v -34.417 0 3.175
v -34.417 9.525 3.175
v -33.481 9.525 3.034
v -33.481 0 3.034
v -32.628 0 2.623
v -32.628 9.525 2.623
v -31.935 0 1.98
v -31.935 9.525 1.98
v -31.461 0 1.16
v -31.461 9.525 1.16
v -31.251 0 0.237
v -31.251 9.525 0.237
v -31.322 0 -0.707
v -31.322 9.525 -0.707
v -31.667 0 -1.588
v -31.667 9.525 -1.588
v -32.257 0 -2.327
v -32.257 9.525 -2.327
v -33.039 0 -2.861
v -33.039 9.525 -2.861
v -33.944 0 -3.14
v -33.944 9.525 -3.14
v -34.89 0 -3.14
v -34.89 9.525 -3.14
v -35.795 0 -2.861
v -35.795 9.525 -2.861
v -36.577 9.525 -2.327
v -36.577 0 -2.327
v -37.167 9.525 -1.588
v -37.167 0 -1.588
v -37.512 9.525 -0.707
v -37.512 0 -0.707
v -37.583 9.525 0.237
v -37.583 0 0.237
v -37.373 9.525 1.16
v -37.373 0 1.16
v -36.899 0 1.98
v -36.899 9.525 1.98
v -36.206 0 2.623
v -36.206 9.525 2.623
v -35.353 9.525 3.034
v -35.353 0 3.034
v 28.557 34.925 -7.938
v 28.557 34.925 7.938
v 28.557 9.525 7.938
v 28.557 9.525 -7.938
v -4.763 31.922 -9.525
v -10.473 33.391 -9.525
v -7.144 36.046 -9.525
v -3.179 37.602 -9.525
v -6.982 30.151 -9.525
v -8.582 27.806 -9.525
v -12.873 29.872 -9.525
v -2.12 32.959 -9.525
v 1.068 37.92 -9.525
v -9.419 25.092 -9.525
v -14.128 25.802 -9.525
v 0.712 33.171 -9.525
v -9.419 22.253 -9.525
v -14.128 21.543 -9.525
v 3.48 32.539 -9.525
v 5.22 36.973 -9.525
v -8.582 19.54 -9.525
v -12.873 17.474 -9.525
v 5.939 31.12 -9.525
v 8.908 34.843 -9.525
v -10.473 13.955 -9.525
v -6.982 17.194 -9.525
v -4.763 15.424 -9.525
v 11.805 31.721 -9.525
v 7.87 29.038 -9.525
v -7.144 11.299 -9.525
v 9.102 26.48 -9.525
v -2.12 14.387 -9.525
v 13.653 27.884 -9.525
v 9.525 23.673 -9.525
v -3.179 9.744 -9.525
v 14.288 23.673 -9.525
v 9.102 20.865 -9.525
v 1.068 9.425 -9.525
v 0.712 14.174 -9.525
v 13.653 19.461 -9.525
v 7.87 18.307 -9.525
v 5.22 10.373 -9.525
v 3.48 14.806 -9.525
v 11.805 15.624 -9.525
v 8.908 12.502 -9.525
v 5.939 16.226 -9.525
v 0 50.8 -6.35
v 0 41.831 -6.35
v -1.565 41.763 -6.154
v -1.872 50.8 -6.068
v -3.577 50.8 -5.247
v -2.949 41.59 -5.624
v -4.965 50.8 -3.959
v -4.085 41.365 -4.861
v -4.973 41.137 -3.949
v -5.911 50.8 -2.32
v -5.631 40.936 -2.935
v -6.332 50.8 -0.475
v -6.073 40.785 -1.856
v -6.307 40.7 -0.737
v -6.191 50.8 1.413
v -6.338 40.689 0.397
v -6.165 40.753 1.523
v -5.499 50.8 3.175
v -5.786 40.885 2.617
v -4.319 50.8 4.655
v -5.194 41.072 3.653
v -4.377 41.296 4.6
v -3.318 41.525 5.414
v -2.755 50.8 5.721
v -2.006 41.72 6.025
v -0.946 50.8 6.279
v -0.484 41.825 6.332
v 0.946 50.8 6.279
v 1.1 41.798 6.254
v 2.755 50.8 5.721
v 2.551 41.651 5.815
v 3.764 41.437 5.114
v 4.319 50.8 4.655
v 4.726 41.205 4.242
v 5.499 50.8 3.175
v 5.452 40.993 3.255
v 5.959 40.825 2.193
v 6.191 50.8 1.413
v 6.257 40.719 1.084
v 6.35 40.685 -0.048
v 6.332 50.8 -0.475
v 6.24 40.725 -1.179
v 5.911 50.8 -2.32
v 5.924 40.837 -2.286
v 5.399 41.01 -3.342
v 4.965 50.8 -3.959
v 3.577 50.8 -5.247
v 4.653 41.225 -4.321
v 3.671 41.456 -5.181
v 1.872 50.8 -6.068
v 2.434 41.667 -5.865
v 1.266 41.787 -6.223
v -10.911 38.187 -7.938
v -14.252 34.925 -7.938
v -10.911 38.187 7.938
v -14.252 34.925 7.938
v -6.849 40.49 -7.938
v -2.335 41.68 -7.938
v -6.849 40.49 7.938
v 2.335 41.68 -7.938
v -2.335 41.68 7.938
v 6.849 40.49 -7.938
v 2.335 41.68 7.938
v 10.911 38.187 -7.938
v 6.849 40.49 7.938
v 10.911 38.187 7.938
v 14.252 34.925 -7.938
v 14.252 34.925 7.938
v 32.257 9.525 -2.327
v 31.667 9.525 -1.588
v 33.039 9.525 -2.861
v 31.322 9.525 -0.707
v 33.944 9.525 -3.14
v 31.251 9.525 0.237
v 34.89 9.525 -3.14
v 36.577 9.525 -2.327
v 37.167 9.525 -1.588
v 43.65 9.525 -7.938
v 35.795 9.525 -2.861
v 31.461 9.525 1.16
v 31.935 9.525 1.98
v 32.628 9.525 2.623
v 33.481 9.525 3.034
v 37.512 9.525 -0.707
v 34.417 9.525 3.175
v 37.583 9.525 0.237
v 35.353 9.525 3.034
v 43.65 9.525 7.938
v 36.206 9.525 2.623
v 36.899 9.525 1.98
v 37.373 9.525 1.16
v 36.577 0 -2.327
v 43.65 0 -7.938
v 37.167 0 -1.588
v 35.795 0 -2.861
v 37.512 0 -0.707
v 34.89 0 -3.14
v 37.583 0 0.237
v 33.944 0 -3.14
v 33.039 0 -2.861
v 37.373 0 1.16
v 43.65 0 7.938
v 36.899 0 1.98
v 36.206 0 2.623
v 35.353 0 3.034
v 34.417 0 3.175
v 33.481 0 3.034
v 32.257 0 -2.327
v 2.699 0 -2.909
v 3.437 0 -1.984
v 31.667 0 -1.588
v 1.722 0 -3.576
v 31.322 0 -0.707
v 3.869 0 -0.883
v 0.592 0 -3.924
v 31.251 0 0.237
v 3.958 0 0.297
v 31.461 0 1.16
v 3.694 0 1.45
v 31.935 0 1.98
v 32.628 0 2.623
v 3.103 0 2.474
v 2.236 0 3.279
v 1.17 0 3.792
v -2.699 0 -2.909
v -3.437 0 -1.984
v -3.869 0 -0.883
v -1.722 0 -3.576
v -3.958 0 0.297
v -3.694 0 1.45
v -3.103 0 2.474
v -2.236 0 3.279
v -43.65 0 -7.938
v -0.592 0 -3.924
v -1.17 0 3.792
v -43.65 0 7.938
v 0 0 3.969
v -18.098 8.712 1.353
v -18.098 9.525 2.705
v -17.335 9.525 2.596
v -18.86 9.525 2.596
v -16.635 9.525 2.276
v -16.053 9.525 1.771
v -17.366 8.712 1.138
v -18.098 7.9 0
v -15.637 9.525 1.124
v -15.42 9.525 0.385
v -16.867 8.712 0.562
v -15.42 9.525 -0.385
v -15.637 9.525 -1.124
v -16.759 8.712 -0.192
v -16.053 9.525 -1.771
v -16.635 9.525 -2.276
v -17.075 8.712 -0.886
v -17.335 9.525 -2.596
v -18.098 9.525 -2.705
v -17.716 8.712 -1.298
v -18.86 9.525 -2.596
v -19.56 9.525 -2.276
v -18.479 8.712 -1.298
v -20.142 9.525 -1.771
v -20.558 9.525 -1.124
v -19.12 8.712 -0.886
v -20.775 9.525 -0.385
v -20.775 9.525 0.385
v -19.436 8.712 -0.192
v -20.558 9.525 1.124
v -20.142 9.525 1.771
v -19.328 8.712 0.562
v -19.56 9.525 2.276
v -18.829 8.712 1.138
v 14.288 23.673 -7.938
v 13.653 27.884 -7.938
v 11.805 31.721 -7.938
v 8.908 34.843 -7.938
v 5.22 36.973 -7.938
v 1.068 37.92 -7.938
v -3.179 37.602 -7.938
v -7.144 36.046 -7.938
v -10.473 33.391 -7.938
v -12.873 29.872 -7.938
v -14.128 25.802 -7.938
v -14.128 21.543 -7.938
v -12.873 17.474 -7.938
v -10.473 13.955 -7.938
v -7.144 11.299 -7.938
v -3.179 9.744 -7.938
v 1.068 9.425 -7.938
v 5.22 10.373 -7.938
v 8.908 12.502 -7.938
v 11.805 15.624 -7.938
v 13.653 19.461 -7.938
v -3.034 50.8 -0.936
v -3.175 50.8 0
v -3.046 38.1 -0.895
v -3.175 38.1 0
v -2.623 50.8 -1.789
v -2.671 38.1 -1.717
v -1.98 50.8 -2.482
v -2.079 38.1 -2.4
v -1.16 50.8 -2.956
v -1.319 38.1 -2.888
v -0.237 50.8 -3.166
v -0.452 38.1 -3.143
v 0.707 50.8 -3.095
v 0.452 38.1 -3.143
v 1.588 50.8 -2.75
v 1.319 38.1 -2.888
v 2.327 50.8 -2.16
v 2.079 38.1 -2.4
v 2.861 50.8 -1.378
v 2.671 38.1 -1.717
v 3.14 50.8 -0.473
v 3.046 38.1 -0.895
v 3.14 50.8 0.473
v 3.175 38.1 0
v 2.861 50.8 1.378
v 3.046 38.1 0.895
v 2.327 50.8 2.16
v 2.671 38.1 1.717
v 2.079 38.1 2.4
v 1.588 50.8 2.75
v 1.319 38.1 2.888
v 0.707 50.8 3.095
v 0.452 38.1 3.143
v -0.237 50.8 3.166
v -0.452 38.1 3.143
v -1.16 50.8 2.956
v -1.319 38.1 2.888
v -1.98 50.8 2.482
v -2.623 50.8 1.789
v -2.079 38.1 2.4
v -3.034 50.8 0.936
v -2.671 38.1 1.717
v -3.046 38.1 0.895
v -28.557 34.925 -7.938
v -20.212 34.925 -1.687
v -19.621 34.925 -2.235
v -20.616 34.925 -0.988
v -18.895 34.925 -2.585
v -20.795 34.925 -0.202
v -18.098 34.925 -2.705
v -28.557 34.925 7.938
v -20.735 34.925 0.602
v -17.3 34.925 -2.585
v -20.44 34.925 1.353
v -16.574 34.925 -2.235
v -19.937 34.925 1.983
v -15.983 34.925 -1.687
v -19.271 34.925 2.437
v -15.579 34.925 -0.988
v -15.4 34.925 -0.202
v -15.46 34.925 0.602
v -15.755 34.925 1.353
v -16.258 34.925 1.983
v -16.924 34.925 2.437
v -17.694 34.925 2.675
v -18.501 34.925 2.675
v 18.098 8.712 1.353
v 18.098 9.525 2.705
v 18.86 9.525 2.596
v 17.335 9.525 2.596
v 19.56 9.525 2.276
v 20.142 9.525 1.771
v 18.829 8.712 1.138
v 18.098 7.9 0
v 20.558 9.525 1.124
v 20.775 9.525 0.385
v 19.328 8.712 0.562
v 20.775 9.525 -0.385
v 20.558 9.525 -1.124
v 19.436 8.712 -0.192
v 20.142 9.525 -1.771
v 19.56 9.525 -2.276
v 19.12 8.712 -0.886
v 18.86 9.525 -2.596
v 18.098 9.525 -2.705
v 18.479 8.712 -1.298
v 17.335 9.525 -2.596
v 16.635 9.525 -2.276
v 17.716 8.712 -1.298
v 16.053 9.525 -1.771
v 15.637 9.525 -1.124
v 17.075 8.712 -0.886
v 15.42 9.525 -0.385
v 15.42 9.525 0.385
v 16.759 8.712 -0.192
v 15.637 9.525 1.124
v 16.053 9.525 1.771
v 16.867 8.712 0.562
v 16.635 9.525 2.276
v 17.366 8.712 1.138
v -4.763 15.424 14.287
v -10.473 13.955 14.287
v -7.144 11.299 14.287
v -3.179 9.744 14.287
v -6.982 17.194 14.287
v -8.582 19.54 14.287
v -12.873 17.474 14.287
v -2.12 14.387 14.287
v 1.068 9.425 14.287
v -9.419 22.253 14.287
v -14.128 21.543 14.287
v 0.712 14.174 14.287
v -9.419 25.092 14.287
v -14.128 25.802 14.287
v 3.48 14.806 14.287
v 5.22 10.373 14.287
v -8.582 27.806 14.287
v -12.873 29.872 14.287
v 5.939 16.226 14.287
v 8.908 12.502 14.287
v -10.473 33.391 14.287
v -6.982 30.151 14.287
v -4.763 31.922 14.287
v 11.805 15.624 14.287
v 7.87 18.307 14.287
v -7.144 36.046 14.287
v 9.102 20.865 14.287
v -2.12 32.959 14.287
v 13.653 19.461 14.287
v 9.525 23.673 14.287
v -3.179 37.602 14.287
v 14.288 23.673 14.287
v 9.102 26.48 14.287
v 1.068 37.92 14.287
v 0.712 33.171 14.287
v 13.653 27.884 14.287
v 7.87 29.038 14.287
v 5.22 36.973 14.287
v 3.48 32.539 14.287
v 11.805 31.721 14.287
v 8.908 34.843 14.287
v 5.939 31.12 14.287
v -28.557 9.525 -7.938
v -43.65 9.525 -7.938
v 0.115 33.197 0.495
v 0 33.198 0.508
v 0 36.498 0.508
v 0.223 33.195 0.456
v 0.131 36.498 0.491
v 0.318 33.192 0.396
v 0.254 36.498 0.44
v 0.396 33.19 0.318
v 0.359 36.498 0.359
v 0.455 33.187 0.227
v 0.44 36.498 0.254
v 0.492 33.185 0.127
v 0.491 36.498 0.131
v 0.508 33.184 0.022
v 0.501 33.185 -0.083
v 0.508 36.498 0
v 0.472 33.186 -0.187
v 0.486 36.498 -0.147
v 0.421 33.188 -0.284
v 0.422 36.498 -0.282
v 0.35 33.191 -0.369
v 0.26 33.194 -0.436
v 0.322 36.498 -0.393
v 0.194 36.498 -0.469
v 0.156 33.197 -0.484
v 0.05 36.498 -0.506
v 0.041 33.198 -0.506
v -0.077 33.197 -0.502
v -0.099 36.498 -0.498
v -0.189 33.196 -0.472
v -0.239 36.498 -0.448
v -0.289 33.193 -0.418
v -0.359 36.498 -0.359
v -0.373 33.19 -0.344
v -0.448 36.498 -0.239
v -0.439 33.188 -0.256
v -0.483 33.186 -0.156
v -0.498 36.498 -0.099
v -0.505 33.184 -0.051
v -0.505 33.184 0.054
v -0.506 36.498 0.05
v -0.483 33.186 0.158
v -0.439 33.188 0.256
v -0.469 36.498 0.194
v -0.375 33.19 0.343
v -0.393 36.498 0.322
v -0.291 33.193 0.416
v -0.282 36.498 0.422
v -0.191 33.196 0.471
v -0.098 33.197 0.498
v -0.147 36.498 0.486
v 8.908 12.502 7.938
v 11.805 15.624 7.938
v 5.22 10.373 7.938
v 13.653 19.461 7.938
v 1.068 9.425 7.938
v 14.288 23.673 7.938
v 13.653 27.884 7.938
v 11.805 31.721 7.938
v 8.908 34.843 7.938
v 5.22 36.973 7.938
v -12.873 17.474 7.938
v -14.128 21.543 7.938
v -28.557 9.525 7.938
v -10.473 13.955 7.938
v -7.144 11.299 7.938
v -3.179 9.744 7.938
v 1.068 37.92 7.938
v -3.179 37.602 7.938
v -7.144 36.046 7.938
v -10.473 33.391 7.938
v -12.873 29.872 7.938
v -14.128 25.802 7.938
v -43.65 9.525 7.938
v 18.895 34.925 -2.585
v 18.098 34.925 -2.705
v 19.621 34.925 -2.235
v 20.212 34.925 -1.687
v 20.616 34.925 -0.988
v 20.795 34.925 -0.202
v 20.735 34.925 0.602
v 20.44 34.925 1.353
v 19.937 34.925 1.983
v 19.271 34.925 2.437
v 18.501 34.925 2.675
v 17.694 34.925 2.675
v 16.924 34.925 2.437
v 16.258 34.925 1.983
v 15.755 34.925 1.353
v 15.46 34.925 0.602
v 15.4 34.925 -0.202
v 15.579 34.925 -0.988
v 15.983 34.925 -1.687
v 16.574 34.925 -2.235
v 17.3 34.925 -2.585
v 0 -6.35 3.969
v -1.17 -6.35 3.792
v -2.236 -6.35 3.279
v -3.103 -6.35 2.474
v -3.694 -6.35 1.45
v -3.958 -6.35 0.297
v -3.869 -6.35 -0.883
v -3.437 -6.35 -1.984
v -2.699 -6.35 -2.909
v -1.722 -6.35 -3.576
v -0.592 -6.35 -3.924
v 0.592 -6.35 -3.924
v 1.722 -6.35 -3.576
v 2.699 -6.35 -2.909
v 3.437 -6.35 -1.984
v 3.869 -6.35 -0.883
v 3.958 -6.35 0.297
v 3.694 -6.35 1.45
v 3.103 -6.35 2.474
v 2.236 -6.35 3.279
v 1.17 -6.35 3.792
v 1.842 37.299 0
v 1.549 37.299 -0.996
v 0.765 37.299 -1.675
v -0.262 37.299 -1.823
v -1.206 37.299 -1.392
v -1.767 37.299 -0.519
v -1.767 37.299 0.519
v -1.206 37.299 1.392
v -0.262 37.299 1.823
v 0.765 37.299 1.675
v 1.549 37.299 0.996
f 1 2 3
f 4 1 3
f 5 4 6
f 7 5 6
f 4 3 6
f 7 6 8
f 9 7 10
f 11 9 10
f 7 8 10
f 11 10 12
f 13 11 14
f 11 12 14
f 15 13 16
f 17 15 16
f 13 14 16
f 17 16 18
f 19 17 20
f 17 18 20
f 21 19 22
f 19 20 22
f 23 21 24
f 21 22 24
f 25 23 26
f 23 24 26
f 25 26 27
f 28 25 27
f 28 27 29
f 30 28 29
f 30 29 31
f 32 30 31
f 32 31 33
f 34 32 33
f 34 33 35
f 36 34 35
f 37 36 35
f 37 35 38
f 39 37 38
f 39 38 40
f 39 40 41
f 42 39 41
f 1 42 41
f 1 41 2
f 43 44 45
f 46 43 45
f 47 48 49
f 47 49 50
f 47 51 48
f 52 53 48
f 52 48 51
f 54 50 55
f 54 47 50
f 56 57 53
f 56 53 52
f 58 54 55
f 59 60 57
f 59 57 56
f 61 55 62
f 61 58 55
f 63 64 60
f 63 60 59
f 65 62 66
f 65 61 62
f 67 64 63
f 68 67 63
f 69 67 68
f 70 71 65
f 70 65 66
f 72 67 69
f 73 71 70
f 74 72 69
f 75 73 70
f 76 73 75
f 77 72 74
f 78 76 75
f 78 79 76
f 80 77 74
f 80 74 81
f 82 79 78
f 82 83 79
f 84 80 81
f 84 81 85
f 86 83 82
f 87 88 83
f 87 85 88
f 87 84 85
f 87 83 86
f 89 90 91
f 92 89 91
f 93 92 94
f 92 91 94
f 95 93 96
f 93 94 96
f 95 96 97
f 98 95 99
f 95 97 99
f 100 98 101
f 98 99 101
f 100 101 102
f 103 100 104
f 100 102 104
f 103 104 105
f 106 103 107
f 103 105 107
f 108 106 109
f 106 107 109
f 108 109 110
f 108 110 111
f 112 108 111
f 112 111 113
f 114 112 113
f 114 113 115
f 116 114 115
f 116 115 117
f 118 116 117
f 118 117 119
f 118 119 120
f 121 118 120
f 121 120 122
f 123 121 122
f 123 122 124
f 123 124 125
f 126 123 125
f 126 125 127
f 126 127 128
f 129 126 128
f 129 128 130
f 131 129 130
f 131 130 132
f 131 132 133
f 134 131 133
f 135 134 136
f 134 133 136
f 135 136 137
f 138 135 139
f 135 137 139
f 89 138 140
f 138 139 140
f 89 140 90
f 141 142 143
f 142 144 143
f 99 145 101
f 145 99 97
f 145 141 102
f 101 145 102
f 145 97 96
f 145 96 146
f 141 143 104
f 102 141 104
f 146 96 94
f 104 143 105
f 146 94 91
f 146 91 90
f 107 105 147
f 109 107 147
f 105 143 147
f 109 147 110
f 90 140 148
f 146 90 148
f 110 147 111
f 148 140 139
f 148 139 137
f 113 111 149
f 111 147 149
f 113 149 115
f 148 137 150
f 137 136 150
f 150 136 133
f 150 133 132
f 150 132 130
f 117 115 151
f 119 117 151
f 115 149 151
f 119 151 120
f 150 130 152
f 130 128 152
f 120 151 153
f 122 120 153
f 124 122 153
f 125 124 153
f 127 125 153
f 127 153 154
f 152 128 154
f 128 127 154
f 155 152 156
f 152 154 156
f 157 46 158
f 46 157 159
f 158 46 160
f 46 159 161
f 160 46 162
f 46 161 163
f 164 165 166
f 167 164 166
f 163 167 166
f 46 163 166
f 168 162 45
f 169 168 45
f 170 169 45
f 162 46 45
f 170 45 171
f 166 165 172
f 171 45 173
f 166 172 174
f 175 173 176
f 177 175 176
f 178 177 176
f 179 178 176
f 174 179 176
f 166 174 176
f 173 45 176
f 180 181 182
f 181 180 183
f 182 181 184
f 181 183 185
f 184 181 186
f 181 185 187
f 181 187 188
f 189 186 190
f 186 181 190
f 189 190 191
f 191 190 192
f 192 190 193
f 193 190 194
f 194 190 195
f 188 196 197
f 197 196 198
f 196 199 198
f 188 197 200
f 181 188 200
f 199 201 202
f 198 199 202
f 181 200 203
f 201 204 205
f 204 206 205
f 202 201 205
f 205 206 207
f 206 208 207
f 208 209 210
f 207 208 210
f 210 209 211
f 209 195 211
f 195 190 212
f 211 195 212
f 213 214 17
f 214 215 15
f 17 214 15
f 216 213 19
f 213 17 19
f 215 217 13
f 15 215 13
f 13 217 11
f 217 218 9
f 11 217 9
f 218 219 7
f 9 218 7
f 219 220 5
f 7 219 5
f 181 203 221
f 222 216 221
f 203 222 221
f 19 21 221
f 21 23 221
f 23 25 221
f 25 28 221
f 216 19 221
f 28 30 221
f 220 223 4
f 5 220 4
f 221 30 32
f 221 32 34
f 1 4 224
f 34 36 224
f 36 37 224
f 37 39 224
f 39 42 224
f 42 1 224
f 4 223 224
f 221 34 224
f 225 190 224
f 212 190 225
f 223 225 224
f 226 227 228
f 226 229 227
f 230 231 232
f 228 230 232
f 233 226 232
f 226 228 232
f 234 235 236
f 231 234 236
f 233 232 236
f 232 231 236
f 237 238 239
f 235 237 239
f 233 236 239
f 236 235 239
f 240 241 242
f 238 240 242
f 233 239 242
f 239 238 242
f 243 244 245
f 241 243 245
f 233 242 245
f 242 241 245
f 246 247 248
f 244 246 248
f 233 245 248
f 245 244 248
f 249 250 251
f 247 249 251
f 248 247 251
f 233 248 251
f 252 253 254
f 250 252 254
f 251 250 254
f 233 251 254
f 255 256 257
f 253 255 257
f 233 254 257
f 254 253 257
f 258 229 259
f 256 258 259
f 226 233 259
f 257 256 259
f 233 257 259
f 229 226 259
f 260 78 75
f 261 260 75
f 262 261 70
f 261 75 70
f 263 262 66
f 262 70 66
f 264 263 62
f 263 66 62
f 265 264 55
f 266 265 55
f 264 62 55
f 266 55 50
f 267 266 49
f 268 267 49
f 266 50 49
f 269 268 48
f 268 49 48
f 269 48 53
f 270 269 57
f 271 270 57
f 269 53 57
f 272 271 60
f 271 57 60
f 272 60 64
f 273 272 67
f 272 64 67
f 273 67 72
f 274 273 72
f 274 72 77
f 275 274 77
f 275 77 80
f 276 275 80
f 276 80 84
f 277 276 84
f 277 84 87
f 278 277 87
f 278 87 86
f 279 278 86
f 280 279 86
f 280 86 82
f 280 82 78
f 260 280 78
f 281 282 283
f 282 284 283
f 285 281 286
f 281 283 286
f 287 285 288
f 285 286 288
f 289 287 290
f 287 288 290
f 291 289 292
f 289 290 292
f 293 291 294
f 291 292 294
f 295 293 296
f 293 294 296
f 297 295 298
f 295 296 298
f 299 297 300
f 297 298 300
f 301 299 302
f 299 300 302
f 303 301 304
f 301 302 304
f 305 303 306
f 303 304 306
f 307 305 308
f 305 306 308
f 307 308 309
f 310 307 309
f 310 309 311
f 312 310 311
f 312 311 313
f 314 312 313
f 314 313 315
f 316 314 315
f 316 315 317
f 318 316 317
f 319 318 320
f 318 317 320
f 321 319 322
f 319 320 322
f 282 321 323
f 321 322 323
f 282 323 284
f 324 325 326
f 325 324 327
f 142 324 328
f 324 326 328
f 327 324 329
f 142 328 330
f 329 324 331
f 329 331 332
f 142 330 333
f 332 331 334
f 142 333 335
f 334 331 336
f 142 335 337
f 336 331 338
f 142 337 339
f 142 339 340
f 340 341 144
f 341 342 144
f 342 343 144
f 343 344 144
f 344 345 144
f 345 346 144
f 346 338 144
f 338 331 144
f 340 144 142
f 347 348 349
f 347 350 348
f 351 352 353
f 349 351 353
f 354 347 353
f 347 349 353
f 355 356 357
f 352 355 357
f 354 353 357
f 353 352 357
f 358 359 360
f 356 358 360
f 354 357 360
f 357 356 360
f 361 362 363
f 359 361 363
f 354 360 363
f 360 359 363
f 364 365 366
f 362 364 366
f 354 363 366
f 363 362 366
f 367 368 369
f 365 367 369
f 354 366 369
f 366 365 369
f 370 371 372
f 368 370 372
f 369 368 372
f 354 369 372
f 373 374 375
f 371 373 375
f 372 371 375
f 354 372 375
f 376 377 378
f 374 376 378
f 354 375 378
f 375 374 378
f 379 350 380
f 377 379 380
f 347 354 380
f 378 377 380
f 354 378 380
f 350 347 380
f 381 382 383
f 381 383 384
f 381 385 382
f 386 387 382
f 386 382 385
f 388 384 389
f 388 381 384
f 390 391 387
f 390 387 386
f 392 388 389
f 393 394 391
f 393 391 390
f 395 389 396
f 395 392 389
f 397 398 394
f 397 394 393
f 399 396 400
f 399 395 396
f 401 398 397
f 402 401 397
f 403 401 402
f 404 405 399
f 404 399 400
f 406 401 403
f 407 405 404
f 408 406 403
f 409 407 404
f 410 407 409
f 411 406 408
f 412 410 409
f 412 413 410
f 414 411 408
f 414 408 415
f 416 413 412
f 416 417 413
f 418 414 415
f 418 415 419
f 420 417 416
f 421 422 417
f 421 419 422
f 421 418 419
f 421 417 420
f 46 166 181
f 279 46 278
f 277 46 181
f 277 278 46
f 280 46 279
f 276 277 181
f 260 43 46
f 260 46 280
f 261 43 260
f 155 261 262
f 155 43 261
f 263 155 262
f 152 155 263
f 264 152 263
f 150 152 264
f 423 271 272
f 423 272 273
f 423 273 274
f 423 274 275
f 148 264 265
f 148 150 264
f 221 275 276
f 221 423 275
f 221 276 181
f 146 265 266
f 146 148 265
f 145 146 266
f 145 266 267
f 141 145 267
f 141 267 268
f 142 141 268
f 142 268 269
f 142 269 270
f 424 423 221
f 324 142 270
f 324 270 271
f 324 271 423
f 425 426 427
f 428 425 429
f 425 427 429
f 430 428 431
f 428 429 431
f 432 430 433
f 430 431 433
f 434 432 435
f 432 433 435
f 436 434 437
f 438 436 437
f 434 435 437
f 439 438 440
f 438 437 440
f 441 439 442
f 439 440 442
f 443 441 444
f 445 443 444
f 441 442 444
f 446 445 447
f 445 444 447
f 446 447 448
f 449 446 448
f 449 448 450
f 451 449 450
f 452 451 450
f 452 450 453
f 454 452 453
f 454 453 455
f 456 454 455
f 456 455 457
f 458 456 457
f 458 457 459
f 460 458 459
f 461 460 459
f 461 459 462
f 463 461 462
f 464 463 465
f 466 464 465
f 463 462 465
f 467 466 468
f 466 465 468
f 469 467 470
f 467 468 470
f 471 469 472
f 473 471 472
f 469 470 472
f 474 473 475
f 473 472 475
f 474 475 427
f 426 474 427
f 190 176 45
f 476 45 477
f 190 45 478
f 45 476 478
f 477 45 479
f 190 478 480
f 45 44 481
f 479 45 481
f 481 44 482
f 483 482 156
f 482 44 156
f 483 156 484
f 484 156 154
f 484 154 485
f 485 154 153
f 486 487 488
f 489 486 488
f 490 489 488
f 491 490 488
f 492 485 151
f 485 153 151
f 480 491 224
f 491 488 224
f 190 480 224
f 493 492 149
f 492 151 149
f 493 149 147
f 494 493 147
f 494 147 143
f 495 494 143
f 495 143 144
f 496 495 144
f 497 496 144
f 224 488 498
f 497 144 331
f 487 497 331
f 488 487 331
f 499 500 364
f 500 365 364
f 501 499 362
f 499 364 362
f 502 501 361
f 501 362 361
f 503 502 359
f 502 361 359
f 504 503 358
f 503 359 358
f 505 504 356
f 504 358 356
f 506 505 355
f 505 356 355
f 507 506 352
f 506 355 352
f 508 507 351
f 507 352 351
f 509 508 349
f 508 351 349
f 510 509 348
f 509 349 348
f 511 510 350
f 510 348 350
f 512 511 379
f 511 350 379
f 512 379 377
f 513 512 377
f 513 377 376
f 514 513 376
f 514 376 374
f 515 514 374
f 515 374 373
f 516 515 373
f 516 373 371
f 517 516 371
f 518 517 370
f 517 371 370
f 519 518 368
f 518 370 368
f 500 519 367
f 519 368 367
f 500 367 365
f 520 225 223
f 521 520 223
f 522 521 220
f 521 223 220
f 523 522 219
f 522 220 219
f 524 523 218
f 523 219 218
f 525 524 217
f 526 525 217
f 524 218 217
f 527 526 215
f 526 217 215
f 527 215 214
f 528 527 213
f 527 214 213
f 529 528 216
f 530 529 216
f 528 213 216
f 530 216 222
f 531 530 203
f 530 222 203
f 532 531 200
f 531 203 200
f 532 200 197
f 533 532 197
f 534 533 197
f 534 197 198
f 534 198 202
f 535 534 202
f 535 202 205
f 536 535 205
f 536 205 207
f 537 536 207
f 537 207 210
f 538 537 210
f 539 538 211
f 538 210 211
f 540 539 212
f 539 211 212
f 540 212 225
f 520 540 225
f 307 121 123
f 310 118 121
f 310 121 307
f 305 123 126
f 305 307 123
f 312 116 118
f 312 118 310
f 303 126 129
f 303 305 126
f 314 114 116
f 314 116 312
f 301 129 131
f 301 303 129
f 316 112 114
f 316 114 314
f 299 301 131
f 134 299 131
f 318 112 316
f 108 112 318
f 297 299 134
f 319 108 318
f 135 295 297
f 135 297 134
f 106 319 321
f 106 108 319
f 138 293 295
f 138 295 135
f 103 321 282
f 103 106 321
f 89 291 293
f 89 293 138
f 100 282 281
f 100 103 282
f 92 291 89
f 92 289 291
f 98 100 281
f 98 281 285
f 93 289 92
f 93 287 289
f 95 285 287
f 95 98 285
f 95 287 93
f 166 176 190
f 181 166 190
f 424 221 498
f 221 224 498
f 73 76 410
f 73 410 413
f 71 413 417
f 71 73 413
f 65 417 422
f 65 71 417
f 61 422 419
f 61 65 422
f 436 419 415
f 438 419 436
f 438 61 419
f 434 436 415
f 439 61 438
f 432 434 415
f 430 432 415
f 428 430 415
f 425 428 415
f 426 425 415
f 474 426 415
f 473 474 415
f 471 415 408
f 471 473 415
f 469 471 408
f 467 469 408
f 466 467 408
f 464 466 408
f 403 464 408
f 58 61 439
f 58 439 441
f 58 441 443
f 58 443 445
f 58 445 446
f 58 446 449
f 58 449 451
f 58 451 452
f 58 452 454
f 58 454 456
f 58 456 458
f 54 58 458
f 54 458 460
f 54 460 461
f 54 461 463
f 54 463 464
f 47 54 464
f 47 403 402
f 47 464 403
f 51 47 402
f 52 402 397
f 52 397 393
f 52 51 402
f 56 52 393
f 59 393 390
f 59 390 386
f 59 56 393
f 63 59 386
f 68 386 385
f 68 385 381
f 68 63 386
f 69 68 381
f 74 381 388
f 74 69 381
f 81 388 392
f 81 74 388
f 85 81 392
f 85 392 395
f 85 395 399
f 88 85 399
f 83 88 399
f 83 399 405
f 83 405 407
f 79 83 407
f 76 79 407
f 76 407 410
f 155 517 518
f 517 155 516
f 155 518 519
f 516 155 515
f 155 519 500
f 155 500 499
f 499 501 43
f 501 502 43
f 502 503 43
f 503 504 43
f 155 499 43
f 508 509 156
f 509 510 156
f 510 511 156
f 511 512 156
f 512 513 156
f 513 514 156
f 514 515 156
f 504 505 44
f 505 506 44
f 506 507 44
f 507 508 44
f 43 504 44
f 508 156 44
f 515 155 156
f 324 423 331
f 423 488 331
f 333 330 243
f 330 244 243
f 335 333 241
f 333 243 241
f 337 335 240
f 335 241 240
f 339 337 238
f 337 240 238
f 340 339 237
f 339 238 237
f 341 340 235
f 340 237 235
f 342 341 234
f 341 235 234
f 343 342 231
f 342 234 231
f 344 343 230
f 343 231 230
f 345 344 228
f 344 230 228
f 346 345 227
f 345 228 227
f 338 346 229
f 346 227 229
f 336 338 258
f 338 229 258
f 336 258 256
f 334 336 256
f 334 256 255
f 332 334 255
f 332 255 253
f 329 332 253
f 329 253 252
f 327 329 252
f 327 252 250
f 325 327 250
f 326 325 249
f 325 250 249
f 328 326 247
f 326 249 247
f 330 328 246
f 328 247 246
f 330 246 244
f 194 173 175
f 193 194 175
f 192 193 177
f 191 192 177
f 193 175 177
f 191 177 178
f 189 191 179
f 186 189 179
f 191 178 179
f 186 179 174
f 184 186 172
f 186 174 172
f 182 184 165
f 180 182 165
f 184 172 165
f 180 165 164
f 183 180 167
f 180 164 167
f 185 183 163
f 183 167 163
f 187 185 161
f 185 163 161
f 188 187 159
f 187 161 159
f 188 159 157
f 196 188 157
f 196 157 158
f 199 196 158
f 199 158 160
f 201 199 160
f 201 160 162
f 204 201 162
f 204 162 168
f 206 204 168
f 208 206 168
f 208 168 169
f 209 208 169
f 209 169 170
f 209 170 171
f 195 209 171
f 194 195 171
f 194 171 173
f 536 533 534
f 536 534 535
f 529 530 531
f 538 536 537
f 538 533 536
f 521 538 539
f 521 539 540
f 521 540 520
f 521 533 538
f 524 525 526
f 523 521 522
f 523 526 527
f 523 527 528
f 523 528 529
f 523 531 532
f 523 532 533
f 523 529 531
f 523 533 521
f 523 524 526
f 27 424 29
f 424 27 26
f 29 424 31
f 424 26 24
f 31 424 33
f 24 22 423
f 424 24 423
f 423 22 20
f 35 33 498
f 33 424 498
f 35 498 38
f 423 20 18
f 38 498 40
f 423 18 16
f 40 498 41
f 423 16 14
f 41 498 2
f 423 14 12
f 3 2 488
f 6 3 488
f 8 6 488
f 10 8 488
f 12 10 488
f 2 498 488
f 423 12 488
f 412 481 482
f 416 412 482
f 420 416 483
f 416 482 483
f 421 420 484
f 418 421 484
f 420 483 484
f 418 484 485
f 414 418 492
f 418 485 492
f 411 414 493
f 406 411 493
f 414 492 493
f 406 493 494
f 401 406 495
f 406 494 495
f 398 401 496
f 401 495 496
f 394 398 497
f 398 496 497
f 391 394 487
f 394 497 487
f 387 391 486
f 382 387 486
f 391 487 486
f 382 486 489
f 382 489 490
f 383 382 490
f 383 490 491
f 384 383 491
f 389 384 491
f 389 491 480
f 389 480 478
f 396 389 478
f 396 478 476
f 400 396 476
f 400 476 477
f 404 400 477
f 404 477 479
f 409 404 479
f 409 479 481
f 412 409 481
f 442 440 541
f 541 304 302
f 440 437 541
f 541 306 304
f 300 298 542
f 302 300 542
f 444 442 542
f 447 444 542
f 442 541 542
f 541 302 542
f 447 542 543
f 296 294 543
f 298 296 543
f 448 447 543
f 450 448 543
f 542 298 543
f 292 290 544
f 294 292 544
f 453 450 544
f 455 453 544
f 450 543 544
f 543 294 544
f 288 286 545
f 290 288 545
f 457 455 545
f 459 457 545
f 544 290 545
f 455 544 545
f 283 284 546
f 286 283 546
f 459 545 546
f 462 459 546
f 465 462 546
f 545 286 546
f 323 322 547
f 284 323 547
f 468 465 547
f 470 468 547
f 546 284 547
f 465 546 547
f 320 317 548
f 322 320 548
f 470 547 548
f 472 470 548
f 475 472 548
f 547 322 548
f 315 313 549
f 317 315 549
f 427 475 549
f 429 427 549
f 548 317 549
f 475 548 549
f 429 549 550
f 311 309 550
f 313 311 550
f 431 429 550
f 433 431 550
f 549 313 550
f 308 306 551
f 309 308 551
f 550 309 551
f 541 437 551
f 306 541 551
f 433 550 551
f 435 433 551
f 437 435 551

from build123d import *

# Parameters (mm, degrees)
SKETCH2_R                       = 14.2875
BOSS_EXTRUDE1_DEPTH             = 7.9375
BOSS_EXTRUDE2_DEPTH             = 14.2875
BOSS_EXTRUDE2_DEPTH_BACK        = 11.1125
SKETCH4_R                       = 14.2875
SKETCH4_R_2                     = 9.525
SKETCH5_R                       = 3.96875
BOSS_EXTRUDE3_DEPTH             = 6.35
SKETCH6_R                       = 6.35
BOSS_EXTRUDE4_DEPTH             = 12.7
SKETCH7_R                       = 3.175
CUT_EXTRUDE1_DEPTH              = 19.05
F_1_4_28_TAPPED_HOLE1_D         = 5.4102
F_1_4_28_TAPPED_HOLE1_DEPTH     = 25.4
F_1_4_28_TAPPED_HOLE1_TIP       = 1.625388061
F_1_4_0_25_DIAMETER_HOLE1_D     = 6.35
F_1_4_0_25_DIAMETER_HOLE1_DEPTH = 12.7
F_1_4_0_25_DIAMETER_HOLE1_TIP   = 1.907732465
SKETCH21_R                      = 0.508
CUT_EXTRUDE2_DEPTH              = 19.05
CUT_EXTRUDE3_START              = -1.5875
SKETCH22_R                      = 14.2875
SKETCH22_R_2                    = 9.525
CUT_EXTRUDE3_DEPTH              = 1.5875


with BuildPart() as part:
    # Sketch2 → Boss-Extrude1 (new, symmetric)
    with BuildSketch(Plane.XY):
        with BuildLine():
            Line((43.6499, 0), (-43.6499, 0))
            Line((-43.6499, 0), (-43.6499, 9.525))
            Line((-43.6499, 9.525), (-28.557248061, 9.525))
            Line((-28.557248061, 9.525), (-28.557248061, 34.925))
            Line((-28.557248061, 34.925), (-14.251577109, 34.925))
            ThreePointArc((-14.251577109, 34.925), (0, 41.830978734), (14.251577109, 34.925))
            Line((14.251577109, 34.925), (28.557248061, 34.925))
            Line((28.557248061, 34.925), (28.557248061, 9.525))
            Line((28.557248061, 9.525), (43.6499, 9.525))
            Line((43.6499, 9.525), (43.6499, 0))
        make_face()
        with Locations((0, 23.6728)):
            Circle(SKETCH2_R, mode=Mode.SUBTRACT)
    extrude(amount=BOSS_EXTRUDE1_DEPTH, both=True)

    # Sketch4 → Boss-Extrude2 (add, two sides: drawn at the far end of the back side and taken through both)
    with BuildSketch(Plane.XY.offset(-BOSS_EXTRUDE2_DEPTH_BACK)):
        with Locations((0, 23.6728)):
            Circle(SKETCH4_R)
        with Locations((0, 23.6728)):
            Circle(SKETCH4_R_2, mode=Mode.SUBTRACT)
    extrude(amount=BOSS_EXTRUDE2_DEPTH + BOSS_EXTRUDE2_DEPTH_BACK)

    # Sketch5 → Boss-Extrude3 (add)
    with BuildSketch(Plane.XZ):
        with Locations(Location((0, 0, 0), (0, 0, 90))):
            Circle(SKETCH5_R)
    extrude(amount=BOSS_EXTRUDE3_DEPTH)

    # Sketch6 → Boss-Extrude4 (add)
    with BuildSketch(Plane(origin=(0, 38.1, 0), x_dir=(1, 0, 0), z_dir=(0, 1, 0))):
        with Locations(Location((0, 0, 0), (0, 0, 90))):
            Circle(SKETCH6_R)
    extrude(amount=BOSS_EXTRUDE4_DEPTH)

    # Sketch7 → Cut-Extrude1 (cut)
    with BuildSketch(Plane(origin=(0, 9.525, 0), x_dir=(1, 0, 0), z_dir=(0, 1, 0))):
        with Locations(Location((34.417, 0, 0), (0, 0, 270))):
            Circle(SKETCH7_R)
        with Locations(Location((-34.417, 0, 0), (0, 0, 270))):
            Circle(SKETCH7_R)
    extrude(amount=-CUT_EXTRUDE1_DEPTH, mode=Mode.SUBTRACT)

    # 1/4-28 Tapped Hole1
    with Locations(Plane(origin=(-18.0975, 34.925, 0), x_dir=(0, 0, 1), z_dir=(0, 1, 0))):
        with Locations((0, 0), (0, 36.195)):
            Hole(F_1_4_28_TAPPED_HOLE1_D / 2, depth=F_1_4_28_TAPPED_HOLE1_DEPTH)
            with Locations((0, 0, -(F_1_4_28_TAPPED_HOLE1_DEPTH + F_1_4_28_TAPPED_HOLE1_TIP / 2))):  # 118° drill point
                Cone(0, F_1_4_28_TAPPED_HOLE1_D / 2, F_1_4_28_TAPPED_HOLE1_TIP, mode=Mode.SUBTRACT)

    # 1/4 (0.25) Diameter Hole1
    with Locations(Plane(origin=(0, 50.8, 0), x_dir=(1, 0, 0), z_dir=(0, 1, 0))):
        with Locations((0, 0)):
            Hole(F_1_4_0_25_DIAMETER_HOLE1_D / 2, depth=F_1_4_0_25_DIAMETER_HOLE1_DEPTH)
            with Locations((0, 0, -(F_1_4_0_25_DIAMETER_HOLE1_DEPTH + F_1_4_0_25_DIAMETER_HOLE1_TIP / 2))):  # 118° drill point
                Cone(0, F_1_4_0_25_DIAMETER_HOLE1_D / 2, F_1_4_0_25_DIAMETER_HOLE1_TIP, mode=Mode.SUBTRACT)

    # Sketch21 → Cut-Extrude2 (cut)
    with BuildSketch(Plane(origin=(0, 50.8, 0), x_dir=(1, 0, 0), z_dir=(0, 1, 0))):
        with Locations(Location((0, 0, 0), (0, 0, 270))):
            Circle(SKETCH21_R)
    extrude(amount=-CUT_EXTRUDE2_DEPTH, mode=Mode.SUBTRACT)

    # Sketch22 → Cut-Extrude3 (cut)
    with BuildSketch(Plane(origin=(0, 0, -11.1125), x_dir=(-1, 0, 0), z_dir=(0, 0, -1)).offset(CUT_EXTRUDE3_START)):
        with Locations(Location((0, 23.6728, 0), (0, 0, 180))):
            Circle(SKETCH22_R)
        with Locations(Location((0, 23.6728, 0), (0, 0, 180))):
            Circle(SKETCH22_R_2, mode=Mode.SUBTRACT)
    extrude(amount=CUT_EXTRUDE3_DEPTH, mode=Mode.SUBTRACT)


solid = part.part
